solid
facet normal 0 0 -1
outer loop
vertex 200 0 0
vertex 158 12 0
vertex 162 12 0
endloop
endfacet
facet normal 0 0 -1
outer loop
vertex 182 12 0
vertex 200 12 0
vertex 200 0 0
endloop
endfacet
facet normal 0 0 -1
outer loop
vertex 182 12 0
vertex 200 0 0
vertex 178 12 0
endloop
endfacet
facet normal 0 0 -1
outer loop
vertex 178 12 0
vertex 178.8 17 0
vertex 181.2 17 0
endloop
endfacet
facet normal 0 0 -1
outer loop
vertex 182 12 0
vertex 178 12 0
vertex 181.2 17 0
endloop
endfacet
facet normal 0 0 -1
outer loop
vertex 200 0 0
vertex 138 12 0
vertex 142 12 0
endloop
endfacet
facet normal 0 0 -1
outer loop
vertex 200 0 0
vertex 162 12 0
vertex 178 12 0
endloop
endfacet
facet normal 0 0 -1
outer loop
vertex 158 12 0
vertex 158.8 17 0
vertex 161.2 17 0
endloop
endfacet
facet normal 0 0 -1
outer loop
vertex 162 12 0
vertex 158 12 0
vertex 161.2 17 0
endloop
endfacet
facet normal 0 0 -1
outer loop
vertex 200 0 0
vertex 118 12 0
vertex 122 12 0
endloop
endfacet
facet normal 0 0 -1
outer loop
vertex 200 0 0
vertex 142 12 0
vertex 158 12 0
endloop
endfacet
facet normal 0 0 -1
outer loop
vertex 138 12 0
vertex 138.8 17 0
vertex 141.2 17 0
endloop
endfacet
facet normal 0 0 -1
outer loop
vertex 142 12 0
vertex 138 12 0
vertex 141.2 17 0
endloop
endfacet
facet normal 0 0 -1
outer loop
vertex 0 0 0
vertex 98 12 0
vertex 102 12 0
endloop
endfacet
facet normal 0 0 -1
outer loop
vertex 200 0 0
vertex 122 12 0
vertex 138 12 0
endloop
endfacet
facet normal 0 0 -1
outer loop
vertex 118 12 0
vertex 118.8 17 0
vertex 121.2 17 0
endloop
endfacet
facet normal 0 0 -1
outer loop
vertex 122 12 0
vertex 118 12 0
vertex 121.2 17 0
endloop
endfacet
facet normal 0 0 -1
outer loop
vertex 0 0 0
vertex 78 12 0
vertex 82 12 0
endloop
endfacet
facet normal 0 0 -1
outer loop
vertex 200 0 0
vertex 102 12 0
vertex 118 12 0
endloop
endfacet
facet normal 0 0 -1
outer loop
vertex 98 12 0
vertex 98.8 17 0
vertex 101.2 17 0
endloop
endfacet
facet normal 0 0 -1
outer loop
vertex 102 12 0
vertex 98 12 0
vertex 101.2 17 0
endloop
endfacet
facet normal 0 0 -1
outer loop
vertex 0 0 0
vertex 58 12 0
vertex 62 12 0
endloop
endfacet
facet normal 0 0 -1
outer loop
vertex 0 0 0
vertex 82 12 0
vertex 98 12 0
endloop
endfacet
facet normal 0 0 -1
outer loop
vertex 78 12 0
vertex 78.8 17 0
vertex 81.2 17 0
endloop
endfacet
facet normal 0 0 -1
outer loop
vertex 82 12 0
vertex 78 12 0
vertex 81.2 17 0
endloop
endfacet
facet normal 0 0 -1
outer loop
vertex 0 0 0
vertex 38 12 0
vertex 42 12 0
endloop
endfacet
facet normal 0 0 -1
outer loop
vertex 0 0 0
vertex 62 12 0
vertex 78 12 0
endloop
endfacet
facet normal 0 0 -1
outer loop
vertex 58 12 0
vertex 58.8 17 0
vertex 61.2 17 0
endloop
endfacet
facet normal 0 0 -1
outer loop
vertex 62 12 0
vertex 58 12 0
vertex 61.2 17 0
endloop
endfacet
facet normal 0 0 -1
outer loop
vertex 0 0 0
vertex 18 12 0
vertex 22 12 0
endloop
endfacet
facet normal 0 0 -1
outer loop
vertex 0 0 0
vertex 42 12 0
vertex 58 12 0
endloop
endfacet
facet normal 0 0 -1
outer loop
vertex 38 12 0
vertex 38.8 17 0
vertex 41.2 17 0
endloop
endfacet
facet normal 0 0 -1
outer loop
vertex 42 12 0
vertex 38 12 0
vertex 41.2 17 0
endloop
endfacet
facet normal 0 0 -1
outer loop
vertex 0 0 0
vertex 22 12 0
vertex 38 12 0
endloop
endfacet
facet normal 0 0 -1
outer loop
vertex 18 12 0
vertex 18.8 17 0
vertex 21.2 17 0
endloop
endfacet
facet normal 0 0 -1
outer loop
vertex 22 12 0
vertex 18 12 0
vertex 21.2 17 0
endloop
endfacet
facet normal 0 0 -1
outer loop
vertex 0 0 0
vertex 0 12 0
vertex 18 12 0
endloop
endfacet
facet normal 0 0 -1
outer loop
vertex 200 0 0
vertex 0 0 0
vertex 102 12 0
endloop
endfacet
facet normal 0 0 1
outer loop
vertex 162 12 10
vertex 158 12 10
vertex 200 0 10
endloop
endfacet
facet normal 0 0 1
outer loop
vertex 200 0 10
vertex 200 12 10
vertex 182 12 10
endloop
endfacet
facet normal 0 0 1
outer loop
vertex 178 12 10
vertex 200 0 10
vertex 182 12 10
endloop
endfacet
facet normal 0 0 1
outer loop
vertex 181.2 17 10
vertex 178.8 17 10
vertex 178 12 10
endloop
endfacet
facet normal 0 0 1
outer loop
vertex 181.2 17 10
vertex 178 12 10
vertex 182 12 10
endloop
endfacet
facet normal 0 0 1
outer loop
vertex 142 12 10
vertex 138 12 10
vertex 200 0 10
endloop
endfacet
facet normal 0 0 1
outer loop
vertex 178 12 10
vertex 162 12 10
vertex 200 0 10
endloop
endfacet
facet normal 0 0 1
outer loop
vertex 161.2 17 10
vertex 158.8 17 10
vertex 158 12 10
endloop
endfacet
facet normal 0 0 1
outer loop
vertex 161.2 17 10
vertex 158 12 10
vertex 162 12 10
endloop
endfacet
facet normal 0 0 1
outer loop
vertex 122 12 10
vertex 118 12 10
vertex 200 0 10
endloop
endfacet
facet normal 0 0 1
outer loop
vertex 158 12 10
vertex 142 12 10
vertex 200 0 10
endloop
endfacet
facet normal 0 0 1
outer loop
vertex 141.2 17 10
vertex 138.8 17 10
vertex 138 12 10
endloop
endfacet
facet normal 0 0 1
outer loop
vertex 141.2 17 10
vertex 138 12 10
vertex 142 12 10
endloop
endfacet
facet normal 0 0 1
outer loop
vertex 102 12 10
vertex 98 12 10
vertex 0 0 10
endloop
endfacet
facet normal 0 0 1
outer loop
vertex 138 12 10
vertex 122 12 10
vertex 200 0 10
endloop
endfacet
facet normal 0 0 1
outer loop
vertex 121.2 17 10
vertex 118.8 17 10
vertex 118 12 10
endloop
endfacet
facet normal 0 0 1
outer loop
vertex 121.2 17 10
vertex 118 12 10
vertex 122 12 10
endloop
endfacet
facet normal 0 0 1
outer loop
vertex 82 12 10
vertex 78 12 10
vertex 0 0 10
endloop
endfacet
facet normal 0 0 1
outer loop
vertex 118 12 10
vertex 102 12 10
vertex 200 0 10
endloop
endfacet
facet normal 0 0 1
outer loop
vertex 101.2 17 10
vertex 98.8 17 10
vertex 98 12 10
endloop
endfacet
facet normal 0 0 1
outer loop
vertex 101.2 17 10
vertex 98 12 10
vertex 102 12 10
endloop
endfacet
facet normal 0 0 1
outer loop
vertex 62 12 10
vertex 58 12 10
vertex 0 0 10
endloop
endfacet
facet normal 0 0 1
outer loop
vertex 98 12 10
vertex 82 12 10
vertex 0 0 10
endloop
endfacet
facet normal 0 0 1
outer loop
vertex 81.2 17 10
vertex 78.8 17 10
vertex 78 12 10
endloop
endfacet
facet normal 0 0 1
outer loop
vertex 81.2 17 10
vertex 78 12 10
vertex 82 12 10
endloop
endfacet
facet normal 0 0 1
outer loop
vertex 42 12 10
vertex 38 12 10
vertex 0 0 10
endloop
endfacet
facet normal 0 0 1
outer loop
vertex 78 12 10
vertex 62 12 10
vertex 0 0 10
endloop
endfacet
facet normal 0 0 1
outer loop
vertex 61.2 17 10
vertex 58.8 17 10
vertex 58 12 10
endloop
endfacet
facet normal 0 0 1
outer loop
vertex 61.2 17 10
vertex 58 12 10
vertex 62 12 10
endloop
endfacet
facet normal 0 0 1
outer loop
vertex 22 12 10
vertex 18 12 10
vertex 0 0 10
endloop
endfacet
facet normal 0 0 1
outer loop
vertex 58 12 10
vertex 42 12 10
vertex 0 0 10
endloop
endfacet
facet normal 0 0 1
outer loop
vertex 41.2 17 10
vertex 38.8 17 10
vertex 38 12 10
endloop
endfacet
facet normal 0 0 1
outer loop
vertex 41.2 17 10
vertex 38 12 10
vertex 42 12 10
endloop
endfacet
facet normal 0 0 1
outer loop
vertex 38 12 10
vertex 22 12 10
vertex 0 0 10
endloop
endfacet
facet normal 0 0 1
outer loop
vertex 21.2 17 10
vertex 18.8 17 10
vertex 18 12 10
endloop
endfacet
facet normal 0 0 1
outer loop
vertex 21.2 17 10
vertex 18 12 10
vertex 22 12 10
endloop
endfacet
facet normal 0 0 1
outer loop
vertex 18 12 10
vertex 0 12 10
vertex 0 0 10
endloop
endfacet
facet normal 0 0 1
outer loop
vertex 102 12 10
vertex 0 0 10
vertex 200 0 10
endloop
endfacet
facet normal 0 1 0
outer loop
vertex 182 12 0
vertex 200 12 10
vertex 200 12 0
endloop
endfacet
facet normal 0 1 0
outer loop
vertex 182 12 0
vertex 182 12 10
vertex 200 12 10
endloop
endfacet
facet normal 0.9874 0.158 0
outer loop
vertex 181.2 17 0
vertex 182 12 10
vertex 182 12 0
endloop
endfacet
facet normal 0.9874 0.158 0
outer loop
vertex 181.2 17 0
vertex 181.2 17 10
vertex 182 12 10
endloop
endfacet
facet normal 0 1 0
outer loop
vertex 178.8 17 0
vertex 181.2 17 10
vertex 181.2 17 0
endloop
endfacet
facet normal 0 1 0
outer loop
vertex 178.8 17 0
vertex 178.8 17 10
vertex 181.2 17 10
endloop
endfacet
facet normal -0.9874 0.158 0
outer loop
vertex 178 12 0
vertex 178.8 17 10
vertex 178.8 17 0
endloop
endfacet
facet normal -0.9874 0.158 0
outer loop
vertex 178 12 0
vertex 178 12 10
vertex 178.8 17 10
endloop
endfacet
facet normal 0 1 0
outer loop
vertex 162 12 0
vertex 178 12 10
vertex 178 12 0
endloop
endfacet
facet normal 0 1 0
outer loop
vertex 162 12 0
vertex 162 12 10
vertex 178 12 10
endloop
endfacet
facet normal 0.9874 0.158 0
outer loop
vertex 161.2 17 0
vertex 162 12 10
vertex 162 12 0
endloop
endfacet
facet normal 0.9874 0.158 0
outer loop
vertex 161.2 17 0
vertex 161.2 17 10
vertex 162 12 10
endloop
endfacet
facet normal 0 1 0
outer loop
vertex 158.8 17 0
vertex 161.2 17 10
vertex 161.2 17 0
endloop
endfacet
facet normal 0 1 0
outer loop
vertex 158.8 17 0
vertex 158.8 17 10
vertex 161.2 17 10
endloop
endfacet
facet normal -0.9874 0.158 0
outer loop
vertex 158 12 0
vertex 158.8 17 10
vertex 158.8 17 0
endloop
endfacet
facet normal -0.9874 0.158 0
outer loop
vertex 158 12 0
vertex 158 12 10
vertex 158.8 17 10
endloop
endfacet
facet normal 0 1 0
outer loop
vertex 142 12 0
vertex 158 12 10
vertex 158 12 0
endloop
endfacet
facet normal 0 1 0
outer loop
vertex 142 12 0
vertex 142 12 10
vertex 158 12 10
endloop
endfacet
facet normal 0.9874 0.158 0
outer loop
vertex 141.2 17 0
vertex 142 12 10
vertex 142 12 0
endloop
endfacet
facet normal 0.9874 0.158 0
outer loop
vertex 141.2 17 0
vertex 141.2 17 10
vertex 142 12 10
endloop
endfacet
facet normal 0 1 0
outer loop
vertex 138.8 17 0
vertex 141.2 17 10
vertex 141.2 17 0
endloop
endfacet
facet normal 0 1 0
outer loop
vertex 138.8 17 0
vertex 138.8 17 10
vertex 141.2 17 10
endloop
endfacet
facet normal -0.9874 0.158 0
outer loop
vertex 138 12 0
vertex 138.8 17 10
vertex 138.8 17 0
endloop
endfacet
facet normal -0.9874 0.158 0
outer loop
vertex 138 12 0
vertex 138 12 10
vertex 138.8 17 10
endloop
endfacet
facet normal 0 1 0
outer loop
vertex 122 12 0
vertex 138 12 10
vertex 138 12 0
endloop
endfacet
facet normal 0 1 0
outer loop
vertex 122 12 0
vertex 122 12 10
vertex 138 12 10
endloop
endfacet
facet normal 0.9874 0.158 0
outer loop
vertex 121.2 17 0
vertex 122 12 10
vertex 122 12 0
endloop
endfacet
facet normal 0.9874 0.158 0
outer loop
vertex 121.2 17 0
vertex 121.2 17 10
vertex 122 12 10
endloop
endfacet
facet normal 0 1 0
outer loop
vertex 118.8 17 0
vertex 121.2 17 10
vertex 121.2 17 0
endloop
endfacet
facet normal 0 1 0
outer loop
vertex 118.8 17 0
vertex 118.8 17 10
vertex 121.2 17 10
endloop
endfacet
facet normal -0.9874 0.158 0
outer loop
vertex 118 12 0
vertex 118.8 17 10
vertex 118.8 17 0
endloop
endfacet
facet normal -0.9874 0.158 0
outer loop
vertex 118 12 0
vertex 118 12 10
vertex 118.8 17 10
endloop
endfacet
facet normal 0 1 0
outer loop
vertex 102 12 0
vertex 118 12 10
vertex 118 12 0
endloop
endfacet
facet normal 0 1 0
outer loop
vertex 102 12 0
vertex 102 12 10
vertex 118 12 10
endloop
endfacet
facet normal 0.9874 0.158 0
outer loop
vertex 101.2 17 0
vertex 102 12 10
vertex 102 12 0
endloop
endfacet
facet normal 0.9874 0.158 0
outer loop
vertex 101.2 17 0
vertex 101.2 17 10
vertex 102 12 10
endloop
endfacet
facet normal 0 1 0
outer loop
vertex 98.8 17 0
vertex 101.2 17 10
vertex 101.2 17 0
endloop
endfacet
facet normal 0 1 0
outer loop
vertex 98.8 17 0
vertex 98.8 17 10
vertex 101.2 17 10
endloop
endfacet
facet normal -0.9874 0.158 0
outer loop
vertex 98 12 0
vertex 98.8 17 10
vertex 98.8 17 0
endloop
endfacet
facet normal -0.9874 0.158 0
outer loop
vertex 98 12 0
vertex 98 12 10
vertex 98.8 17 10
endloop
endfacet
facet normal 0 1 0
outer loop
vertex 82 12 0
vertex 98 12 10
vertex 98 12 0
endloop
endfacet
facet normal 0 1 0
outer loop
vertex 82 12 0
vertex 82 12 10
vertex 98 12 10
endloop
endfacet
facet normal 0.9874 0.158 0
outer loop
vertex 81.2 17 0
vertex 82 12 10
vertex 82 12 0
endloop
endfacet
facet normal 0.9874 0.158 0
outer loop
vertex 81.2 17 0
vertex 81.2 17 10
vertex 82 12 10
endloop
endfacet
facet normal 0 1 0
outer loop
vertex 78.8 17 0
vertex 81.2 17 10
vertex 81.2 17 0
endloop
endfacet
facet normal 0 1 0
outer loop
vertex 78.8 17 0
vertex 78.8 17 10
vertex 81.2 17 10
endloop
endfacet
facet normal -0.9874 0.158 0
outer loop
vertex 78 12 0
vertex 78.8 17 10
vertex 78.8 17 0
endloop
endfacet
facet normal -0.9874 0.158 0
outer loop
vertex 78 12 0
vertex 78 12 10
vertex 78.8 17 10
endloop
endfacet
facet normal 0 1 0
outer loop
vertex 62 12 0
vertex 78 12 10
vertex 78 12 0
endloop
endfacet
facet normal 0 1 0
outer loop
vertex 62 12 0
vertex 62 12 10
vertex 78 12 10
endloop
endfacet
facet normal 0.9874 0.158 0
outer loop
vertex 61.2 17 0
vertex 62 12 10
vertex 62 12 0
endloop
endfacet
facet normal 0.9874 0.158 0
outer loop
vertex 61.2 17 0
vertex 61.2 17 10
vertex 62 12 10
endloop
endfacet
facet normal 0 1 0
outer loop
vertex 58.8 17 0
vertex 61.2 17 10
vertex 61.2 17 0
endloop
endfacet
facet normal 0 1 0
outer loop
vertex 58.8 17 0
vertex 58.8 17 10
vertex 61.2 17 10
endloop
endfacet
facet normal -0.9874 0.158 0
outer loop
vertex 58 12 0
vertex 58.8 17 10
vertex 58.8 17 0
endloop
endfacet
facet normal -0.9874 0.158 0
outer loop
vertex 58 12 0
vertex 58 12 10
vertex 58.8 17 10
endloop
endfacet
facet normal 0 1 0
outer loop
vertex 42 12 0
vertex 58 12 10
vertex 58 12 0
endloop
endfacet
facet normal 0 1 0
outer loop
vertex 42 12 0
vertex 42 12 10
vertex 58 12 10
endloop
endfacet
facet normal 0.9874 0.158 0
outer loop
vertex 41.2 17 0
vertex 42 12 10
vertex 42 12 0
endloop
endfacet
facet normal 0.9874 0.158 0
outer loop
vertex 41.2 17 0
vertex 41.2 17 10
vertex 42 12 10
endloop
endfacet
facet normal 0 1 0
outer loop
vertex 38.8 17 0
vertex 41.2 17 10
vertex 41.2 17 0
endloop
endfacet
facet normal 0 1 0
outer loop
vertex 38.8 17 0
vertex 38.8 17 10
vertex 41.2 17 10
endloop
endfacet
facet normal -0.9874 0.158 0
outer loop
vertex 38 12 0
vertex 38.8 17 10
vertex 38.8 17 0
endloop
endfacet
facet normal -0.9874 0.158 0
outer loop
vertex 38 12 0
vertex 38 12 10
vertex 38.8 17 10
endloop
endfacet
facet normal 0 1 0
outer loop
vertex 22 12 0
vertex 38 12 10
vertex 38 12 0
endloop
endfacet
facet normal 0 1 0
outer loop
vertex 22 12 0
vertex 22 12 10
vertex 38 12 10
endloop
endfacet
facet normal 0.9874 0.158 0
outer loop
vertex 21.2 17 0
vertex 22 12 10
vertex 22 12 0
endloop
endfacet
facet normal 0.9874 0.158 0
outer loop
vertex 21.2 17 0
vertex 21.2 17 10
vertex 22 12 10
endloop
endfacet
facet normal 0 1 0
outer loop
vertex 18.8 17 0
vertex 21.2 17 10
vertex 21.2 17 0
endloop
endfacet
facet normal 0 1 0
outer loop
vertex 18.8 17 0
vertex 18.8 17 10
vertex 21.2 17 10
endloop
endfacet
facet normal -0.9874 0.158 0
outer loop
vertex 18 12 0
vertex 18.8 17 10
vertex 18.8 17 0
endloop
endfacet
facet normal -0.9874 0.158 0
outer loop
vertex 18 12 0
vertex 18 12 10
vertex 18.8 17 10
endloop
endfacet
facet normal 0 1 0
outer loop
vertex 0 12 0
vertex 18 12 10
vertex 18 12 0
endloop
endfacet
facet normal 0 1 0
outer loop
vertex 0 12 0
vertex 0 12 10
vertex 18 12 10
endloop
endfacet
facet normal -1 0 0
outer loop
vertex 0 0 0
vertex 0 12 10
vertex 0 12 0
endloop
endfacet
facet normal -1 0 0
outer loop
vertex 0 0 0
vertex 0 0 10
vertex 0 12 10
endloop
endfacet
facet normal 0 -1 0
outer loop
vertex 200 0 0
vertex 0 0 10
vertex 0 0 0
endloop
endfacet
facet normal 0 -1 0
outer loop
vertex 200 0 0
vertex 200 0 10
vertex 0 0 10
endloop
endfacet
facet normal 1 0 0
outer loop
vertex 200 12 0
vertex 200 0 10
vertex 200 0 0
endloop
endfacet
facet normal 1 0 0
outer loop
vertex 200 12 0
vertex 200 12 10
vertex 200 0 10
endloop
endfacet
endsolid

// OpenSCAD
$fn = 32;

// ----------------------------------------------------------------------
// Gear rack: 9 teeth on a 200 mm bar, pitch 20 mm
// ----------------------------------------------------------------------

// --- parameters (mm) ---
profile_height = 10;      // extrusion height
profile_points = 40;      // points of the closed outline

profile = [[0, 0], [200, 0], [200, 12], [182, 12], [181.2, 17], [178.8, 17], [178, 12], [162, 12], [161.2, 17], [158.8, 17], [158, 12], [142, 12], [141.2, 17], [138.8, 17], [138, 12], [122, 12], [121.2, 17], [118.8, 17], [118, 12], [102, 12], [101.2, 17], [98.8, 17], [98, 12], [82, 12], [81.2, 17], [78.8, 17], [78, 12], [62, 12], [61.2, 17], [58.8, 17], [58, 12], [42, 12], [41.2, 17], [38.8, 17], [38, 12], [22, 12], [21.2, 17], [18.8, 17], [18, 12], [0, 12]];  // single closed polygon, 40 points, counter clockwise

// --- the one profile operation ---
linear_extrude(height = profile_height) polygon(points = profile);
